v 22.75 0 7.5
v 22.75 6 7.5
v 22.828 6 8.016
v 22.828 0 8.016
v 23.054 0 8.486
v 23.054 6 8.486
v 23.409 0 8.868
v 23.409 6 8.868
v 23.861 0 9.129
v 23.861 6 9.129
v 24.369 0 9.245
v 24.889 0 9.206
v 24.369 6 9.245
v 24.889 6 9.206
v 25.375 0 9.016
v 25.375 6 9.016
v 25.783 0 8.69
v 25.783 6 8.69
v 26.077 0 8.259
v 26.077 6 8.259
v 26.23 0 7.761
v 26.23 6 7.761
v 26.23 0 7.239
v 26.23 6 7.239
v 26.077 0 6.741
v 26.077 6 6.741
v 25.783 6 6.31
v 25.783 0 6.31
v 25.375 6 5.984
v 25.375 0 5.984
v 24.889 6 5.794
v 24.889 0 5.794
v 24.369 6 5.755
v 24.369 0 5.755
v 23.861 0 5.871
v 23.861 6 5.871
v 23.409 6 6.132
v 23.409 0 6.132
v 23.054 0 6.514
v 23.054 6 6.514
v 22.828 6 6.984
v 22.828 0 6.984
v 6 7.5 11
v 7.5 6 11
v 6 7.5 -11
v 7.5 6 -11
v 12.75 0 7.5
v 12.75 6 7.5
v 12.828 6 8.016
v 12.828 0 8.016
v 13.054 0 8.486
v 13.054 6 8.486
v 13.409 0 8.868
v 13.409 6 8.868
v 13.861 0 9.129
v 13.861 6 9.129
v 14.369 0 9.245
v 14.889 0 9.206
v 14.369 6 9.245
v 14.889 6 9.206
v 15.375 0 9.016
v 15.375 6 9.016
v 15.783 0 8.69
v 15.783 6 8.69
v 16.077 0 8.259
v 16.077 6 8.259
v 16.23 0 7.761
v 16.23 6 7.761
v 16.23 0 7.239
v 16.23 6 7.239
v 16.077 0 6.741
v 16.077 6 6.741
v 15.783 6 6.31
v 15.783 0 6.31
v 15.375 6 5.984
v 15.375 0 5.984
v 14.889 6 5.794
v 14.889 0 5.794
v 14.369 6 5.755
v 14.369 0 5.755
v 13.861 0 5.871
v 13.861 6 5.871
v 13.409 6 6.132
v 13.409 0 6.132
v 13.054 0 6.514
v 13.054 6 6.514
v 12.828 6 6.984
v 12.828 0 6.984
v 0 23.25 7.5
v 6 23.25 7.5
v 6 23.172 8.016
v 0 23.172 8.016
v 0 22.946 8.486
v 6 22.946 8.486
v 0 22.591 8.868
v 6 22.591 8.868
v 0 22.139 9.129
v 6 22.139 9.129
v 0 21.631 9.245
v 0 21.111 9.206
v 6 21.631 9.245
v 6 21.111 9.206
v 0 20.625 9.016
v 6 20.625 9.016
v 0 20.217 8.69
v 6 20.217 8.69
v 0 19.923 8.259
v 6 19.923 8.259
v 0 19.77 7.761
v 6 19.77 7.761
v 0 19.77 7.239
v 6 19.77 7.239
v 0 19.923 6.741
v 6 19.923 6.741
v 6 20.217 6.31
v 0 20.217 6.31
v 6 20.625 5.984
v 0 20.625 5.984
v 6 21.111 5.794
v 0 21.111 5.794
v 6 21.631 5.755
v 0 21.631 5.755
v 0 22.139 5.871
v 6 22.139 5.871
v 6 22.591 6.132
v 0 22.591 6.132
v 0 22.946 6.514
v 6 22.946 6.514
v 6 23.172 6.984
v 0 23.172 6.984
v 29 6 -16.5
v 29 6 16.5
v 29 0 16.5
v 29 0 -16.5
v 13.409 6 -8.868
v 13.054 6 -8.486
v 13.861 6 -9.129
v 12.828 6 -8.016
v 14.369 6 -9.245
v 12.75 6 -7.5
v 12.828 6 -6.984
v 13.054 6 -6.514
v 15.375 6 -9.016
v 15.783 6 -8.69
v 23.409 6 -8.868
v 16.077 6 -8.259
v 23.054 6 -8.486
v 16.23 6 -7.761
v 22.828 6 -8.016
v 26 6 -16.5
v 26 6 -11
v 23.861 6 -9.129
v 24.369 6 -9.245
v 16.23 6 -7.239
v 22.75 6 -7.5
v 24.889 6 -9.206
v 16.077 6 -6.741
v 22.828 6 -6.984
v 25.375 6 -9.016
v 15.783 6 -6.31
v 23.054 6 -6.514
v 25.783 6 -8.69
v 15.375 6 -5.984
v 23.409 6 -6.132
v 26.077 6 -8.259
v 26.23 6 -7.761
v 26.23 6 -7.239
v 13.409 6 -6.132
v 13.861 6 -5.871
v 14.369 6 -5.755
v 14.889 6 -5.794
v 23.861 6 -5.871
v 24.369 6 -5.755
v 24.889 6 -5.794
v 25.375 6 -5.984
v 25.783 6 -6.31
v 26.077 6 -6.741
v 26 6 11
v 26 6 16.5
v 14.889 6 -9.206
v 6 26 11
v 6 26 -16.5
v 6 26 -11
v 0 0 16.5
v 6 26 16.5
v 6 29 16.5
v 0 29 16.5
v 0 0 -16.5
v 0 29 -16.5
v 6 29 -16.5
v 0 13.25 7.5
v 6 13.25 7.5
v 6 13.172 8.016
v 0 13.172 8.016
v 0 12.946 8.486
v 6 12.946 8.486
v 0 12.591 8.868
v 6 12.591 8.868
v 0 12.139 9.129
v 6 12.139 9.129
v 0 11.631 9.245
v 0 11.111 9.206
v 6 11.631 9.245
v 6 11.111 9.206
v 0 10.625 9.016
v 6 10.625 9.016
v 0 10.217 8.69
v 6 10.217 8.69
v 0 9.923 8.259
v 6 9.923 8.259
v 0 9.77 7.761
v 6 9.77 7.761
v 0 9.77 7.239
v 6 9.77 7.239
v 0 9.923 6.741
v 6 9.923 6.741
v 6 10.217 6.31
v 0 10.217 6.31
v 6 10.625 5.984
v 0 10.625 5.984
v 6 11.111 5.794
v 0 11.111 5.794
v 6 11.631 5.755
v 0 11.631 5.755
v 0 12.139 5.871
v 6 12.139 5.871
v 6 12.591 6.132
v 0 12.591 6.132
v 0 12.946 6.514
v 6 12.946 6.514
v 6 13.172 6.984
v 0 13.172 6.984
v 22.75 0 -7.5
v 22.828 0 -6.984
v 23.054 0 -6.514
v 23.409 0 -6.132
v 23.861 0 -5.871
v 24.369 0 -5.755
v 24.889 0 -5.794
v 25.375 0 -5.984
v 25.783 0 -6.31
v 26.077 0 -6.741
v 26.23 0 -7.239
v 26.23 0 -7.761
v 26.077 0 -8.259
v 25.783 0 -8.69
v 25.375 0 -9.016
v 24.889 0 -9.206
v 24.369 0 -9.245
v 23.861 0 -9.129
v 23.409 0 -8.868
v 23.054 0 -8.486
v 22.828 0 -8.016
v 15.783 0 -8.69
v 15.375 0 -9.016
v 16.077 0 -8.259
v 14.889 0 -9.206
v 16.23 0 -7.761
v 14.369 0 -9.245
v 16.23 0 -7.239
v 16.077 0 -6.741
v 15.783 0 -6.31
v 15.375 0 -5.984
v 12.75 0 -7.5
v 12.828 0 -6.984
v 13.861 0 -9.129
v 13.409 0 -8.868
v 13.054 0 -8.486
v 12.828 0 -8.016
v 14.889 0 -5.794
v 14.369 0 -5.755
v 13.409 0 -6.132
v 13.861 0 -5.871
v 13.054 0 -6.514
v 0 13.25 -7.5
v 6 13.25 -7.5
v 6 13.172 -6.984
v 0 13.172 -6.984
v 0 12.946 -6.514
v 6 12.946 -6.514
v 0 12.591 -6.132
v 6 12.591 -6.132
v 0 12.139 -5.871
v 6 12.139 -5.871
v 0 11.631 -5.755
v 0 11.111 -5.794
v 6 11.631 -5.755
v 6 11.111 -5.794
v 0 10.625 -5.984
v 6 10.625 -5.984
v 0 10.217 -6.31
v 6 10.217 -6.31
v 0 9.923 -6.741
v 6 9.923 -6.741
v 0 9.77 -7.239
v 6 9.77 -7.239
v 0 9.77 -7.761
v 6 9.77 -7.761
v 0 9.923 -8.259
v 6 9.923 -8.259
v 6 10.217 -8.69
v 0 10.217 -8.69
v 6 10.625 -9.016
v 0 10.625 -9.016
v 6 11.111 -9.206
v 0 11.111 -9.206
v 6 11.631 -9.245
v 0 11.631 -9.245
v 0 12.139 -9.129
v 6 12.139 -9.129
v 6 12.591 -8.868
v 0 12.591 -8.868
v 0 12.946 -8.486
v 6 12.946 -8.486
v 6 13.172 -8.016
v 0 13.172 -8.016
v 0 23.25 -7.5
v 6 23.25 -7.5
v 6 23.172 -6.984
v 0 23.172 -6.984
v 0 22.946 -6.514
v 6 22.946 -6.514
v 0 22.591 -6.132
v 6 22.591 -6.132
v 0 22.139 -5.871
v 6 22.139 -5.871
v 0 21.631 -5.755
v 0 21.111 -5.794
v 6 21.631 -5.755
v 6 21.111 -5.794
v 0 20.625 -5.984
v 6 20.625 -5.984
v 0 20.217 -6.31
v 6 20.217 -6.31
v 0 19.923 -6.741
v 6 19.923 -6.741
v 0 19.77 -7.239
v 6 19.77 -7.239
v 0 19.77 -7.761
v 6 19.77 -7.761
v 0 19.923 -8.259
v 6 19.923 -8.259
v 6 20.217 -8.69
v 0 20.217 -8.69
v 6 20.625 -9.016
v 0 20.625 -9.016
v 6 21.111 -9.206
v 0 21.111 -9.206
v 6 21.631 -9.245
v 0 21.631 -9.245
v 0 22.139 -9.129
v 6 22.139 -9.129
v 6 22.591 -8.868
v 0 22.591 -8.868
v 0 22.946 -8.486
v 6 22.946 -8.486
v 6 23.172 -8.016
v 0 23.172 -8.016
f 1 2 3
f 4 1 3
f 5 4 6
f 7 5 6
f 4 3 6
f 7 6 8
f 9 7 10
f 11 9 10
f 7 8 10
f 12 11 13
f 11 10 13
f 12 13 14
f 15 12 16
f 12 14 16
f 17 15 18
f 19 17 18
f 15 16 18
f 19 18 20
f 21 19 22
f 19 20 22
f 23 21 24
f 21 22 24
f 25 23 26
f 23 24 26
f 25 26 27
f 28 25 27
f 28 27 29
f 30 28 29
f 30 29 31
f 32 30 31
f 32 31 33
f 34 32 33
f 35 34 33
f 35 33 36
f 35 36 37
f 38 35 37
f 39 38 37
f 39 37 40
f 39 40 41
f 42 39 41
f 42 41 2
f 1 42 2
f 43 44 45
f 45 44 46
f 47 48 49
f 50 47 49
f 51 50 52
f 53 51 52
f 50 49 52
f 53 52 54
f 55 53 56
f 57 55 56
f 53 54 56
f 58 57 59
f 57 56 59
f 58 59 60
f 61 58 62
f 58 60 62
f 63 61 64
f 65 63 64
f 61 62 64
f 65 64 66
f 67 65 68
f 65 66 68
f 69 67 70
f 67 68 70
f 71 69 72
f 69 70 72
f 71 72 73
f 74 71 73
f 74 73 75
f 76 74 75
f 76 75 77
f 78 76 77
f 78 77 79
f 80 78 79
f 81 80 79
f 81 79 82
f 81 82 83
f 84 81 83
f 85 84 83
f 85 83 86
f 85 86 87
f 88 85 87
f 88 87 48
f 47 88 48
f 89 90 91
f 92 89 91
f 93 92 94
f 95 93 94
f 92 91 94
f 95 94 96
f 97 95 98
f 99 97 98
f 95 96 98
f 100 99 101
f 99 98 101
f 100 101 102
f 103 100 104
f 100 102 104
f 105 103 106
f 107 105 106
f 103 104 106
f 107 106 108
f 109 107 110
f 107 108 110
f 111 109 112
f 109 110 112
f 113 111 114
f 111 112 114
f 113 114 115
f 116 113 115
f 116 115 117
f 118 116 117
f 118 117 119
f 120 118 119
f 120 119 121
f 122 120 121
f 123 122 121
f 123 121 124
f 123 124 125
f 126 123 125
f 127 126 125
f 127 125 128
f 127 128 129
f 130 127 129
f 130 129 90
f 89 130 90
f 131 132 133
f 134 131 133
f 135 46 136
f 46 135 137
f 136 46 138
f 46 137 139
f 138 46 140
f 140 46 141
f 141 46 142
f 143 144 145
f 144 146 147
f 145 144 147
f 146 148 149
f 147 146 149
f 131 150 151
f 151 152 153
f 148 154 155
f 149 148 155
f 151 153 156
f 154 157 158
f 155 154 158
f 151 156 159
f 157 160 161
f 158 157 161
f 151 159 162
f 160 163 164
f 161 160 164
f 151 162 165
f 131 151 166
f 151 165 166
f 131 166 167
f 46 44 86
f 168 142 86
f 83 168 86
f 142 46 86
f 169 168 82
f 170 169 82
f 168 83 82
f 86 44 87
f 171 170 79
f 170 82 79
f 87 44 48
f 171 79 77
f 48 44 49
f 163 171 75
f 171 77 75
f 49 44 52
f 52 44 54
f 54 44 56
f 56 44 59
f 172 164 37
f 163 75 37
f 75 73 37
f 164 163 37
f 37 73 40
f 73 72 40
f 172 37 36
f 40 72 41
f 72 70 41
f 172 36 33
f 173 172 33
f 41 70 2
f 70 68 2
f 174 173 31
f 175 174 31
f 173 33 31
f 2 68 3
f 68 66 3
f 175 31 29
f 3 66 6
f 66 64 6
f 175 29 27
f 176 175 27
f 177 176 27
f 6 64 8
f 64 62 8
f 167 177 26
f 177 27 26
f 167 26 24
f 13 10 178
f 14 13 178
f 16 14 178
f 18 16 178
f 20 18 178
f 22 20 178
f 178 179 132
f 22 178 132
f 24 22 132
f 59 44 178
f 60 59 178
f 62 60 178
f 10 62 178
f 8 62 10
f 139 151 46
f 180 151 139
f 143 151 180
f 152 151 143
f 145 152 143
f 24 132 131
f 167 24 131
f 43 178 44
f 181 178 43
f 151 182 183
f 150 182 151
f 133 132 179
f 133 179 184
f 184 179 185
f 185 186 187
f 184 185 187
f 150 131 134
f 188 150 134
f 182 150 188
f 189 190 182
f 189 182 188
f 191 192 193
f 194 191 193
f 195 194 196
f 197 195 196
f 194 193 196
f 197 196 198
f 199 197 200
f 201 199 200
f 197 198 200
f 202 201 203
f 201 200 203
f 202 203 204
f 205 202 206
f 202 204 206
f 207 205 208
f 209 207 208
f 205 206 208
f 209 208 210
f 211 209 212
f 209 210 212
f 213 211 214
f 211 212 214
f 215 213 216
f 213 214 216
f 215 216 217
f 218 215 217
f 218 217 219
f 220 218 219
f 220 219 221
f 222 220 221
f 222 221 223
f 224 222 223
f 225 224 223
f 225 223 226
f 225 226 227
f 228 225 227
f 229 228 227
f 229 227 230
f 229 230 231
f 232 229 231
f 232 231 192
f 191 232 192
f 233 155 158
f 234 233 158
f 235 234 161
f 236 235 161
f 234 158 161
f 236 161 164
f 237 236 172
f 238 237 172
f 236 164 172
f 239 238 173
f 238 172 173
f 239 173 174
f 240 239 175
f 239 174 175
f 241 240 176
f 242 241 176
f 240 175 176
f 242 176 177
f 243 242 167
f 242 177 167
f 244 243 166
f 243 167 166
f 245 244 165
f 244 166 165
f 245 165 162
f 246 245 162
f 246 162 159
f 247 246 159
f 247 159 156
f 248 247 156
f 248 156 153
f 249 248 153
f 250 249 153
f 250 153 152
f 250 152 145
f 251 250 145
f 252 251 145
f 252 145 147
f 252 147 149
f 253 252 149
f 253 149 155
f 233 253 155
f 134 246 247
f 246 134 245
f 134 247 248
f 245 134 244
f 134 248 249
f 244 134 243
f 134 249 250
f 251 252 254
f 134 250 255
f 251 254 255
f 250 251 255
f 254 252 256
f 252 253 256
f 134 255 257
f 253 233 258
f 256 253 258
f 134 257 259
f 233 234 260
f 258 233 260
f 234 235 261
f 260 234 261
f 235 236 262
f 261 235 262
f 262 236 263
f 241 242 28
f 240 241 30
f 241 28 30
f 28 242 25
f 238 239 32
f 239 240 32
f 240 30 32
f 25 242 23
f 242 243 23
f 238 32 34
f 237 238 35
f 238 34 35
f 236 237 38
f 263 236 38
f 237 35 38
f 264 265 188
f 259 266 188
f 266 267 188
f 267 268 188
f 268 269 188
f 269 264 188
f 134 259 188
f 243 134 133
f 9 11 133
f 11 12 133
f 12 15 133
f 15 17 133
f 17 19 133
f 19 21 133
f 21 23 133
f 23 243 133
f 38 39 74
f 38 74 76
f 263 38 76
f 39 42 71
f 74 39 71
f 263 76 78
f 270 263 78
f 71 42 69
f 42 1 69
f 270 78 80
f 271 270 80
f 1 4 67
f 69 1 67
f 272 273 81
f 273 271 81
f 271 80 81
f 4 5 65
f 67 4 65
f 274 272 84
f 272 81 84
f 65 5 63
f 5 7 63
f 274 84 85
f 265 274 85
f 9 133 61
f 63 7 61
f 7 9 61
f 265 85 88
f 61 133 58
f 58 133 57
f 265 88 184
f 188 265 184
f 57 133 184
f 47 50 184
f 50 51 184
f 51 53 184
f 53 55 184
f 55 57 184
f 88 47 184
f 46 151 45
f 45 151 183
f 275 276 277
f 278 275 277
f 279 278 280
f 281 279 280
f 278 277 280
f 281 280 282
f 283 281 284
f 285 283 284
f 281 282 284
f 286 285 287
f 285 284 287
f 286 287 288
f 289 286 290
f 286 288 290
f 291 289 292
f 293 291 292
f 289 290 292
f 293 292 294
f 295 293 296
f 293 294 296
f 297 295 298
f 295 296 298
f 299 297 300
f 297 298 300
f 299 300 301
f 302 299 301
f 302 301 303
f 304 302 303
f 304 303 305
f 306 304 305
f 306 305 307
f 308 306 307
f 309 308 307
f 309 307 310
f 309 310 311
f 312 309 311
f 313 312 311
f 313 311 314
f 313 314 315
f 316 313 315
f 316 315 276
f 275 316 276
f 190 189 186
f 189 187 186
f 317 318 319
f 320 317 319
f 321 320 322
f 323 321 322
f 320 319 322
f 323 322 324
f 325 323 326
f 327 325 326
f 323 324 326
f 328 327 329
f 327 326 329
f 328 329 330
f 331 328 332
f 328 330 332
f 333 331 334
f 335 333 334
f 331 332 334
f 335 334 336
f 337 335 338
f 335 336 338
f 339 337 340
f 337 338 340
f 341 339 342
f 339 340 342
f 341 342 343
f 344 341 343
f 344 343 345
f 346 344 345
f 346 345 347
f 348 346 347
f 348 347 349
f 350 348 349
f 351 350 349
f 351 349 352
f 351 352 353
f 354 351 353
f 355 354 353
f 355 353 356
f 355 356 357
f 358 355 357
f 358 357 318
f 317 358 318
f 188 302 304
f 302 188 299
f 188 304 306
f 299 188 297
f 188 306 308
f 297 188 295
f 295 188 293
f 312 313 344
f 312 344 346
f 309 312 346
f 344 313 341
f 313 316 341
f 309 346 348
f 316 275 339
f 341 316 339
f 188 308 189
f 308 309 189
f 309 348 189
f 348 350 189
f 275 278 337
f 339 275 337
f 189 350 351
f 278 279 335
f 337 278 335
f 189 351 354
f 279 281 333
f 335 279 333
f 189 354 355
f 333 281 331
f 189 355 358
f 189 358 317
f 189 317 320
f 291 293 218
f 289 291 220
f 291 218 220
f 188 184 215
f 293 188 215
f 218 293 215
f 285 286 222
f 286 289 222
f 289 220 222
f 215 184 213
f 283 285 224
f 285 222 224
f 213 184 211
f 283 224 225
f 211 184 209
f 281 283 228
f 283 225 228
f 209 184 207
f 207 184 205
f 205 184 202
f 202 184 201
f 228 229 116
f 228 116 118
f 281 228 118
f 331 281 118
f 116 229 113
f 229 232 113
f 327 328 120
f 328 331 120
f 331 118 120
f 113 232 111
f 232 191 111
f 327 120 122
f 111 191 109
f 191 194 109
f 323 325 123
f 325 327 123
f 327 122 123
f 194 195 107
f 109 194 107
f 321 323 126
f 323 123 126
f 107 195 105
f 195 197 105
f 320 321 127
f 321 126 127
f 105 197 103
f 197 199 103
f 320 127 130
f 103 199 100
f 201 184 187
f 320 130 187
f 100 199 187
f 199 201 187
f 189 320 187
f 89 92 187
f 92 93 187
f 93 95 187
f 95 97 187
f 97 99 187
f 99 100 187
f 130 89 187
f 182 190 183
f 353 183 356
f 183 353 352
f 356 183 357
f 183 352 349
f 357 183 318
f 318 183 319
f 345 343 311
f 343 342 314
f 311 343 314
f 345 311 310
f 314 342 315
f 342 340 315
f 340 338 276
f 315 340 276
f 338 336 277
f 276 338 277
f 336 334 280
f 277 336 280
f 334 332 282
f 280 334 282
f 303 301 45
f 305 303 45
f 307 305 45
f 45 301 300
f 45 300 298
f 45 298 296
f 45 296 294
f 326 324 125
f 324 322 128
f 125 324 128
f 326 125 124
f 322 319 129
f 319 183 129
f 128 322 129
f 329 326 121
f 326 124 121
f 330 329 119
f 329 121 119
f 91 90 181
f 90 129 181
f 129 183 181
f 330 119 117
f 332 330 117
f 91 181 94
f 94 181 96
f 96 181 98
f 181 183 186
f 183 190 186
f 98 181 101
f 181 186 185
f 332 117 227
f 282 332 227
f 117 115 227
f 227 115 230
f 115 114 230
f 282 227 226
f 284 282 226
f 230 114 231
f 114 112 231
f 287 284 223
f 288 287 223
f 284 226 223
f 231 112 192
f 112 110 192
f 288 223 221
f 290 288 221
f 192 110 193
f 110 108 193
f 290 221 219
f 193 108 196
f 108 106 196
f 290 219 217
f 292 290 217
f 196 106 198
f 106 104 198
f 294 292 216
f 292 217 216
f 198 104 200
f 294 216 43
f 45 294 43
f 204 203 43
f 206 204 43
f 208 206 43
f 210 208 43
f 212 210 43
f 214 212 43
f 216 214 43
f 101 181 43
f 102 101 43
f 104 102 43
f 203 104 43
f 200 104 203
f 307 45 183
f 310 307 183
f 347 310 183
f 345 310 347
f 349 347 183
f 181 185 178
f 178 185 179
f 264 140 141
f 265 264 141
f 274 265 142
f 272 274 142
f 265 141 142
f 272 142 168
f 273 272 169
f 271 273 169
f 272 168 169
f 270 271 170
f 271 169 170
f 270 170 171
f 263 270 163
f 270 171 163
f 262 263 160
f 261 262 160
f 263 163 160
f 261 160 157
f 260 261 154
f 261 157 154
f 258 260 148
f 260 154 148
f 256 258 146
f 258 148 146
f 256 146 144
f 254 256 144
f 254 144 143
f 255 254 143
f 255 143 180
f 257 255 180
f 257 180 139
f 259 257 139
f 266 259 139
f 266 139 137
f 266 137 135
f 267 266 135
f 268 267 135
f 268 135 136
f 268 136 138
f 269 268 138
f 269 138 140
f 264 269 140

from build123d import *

# Parameters (mm, degrees)
BOSS_EXTRUDE1_DEPTH = 16.5
CUT_EXTRUDE1_REACH  = 42.525
SKETCH2_R           = 1.75
CUT_EXTRUDE2_REACH  = 42.525
SKETCH6_R           = 1.75
BOSS_EXTRUDE2_DEPTH = 5.5
CHAMFER1_SIZE       = 1.5


with BuildPart() as part:
    # Sketch1 → Boss-Extrude1 (new, symmetric)
    with BuildSketch(Plane.XY):
        Polygon((0, 0), (0, 29), (6, 29), (6, 6), (29, 6), (29, 0), align=None)
    extrude(amount=BOSS_EXTRUDE1_DEPTH, both=True)

    # Sketch2 → Cut-Extrude1 (cut, up to next)
    with BuildSketch(Plane(origin=(6, 0, 0), x_dir=(0, 0, -1), z_dir=(1, 0, 0)), mode=Mode.PRIVATE) as cut_extrude1_sk1:
        with Locations(Location((7.5, 21.5, 0), (0, 0, 90))):
            Circle(SKETCH2_R)
    cut_extrude1_tool1 = extrude(cut_extrude1_sk1.sketch, amount=-CUT_EXTRUDE1_REACH, mode=Mode.PRIVATE) & part.part
    # Sketch2 → Cut-Extrude1 (cut, up to next)
    with BuildSketch(Plane(origin=(6, 0, 0), x_dir=(0, 0, -1), z_dir=(1, 0, 0)), mode=Mode.PRIVATE) as cut_extrude1_sk2:
        with Locations(Location((7.5, 11.5, 0), (0, 0, 90))):
            Circle(SKETCH2_R)
    cut_extrude1_tool2 = extrude(cut_extrude1_sk2.sketch, amount=-CUT_EXTRUDE1_REACH, mode=Mode.PRIVATE) & part.part
    # Sketch2 → Cut-Extrude1 (cut, up to next)
    with BuildSketch(Plane(origin=(6, 0, 0), x_dir=(0, 0, -1), z_dir=(1, 0, 0)), mode=Mode.PRIVATE) as cut_extrude1_sk3:
        with Locations(Location((-7.5, 11.5, 0), (0, 0, 90))):
            Circle(SKETCH2_R)
    cut_extrude1_tool3 = extrude(cut_extrude1_sk3.sketch, amount=-CUT_EXTRUDE1_REACH, mode=Mode.PRIVATE) & part.part
    # Sketch2 → Cut-Extrude1 (cut, up to next)
    with BuildSketch(Plane(origin=(6, 0, 0), x_dir=(0, 0, -1), z_dir=(1, 0, 0)), mode=Mode.PRIVATE) as cut_extrude1_sk4:
        with Locations(Location((-7.5, 21.5, 0), (0, 0, 90))):
            Circle(SKETCH2_R)
    cut_extrude1_tool4 = extrude(cut_extrude1_sk4.sketch, amount=-CUT_EXTRUDE1_REACH, mode=Mode.PRIVATE) & part.part
    add(cut_extrude1_tool1.solids().sort_by_distance((6, 21.5, -7.5))[0], mode=Mode.SUBTRACT)
    add(cut_extrude1_tool2.solids().sort_by_distance((6, 11.5, -7.5))[0], mode=Mode.SUBTRACT)
    add(cut_extrude1_tool3.solids().sort_by_distance((6, 11.5, 7.5))[0], mode=Mode.SUBTRACT)
    add(cut_extrude1_tool4.solids().sort_by_distance((6, 21.5, 7.5))[0], mode=Mode.SUBTRACT)

    # Sketch6 → Cut-Extrude2 (cut, up to next)
    with BuildSketch(Plane(origin=(0, 6, 0), x_dir=(1, 0, 0), z_dir=(0, 1, 0)), mode=Mode.PRIVATE) as cut_extrude2_sk1:
        with Locations(Location((14.5, -7.5, 0), (0, 0, 180))):
            Circle(SKETCH6_R)
    cut_extrude2_tool1 = extrude(cut_extrude2_sk1.sketch, amount=-CUT_EXTRUDE2_REACH, mode=Mode.PRIVATE) & part.part
    # Sketch6 → Cut-Extrude2 (cut, up to next)
    with BuildSketch(Plane(origin=(0, 6, 0), x_dir=(1, 0, 0), z_dir=(0, 1, 0)), mode=Mode.PRIVATE) as cut_extrude2_sk2:
        with Locations(Location((14.5, 7.5, 0), (0, 0, 180))):
            Circle(SKETCH6_R)
    cut_extrude2_tool2 = extrude(cut_extrude2_sk2.sketch, amount=-CUT_EXTRUDE2_REACH, mode=Mode.PRIVATE) & part.part
    # Sketch6 → Cut-Extrude2 (cut, up to next)
    with BuildSketch(Plane(origin=(0, 6, 0), x_dir=(1, 0, 0), z_dir=(0, 1, 0)), mode=Mode.PRIVATE) as cut_extrude2_sk3:
        with Locations(Location((24.5, 7.5, 0), (0, 0, 180))):
            Circle(SKETCH6_R)
    cut_extrude2_tool3 = extrude(cut_extrude2_sk3.sketch, amount=-CUT_EXTRUDE2_REACH, mode=Mode.PRIVATE) & part.part
    # Sketch6 → Cut-Extrude2 (cut, up to next)
    with BuildSketch(Plane(origin=(0, 6, 0), x_dir=(1, 0, 0), z_dir=(0, 1, 0)), mode=Mode.PRIVATE) as cut_extrude2_sk4:
        with Locations(Location((24.5, -7.5, 0), (0, 0, 180))):
            Circle(SKETCH6_R)
    cut_extrude2_tool4 = extrude(cut_extrude2_sk4.sketch, amount=-CUT_EXTRUDE2_REACH, mode=Mode.PRIVATE) & part.part
    add(cut_extrude2_tool1.solids().sort_by_distance((14.5, 6, 7.5))[0], mode=Mode.SUBTRACT)
    add(cut_extrude2_tool2.solids().sort_by_distance((14.5, 6, -7.5))[0], mode=Mode.SUBTRACT)
    add(cut_extrude2_tool3.solids().sort_by_distance((24.5, 6, -7.5))[0], mode=Mode.SUBTRACT)
    add(cut_extrude2_tool4.solids().sort_by_distance((24.5, 6, 7.5))[0], mode=Mode.SUBTRACT)

    # Sketch3 → Boss-Extrude2 (add)
    with BuildSketch(Plane.XY.offset(16.5)):
        Polygon((6, 26), (26, 6), (6, 6), align=None)
    boss_extrude2 = extrude(amount=-BOSS_EXTRUDE2_DEPTH)

    # Mirror1: Boss-Extrude2 across plane
    add(boss_extrude2.mirror(Plane.XY))

    # Chamfer1
    chamfer1_edges = [part.edges().sort_by_distance(p)[0] for p in [
        (6, 6, 0),
    ]]
    chamfer(chamfer1_edges, length=CHAMFER1_SIZE)


solid = part.part
